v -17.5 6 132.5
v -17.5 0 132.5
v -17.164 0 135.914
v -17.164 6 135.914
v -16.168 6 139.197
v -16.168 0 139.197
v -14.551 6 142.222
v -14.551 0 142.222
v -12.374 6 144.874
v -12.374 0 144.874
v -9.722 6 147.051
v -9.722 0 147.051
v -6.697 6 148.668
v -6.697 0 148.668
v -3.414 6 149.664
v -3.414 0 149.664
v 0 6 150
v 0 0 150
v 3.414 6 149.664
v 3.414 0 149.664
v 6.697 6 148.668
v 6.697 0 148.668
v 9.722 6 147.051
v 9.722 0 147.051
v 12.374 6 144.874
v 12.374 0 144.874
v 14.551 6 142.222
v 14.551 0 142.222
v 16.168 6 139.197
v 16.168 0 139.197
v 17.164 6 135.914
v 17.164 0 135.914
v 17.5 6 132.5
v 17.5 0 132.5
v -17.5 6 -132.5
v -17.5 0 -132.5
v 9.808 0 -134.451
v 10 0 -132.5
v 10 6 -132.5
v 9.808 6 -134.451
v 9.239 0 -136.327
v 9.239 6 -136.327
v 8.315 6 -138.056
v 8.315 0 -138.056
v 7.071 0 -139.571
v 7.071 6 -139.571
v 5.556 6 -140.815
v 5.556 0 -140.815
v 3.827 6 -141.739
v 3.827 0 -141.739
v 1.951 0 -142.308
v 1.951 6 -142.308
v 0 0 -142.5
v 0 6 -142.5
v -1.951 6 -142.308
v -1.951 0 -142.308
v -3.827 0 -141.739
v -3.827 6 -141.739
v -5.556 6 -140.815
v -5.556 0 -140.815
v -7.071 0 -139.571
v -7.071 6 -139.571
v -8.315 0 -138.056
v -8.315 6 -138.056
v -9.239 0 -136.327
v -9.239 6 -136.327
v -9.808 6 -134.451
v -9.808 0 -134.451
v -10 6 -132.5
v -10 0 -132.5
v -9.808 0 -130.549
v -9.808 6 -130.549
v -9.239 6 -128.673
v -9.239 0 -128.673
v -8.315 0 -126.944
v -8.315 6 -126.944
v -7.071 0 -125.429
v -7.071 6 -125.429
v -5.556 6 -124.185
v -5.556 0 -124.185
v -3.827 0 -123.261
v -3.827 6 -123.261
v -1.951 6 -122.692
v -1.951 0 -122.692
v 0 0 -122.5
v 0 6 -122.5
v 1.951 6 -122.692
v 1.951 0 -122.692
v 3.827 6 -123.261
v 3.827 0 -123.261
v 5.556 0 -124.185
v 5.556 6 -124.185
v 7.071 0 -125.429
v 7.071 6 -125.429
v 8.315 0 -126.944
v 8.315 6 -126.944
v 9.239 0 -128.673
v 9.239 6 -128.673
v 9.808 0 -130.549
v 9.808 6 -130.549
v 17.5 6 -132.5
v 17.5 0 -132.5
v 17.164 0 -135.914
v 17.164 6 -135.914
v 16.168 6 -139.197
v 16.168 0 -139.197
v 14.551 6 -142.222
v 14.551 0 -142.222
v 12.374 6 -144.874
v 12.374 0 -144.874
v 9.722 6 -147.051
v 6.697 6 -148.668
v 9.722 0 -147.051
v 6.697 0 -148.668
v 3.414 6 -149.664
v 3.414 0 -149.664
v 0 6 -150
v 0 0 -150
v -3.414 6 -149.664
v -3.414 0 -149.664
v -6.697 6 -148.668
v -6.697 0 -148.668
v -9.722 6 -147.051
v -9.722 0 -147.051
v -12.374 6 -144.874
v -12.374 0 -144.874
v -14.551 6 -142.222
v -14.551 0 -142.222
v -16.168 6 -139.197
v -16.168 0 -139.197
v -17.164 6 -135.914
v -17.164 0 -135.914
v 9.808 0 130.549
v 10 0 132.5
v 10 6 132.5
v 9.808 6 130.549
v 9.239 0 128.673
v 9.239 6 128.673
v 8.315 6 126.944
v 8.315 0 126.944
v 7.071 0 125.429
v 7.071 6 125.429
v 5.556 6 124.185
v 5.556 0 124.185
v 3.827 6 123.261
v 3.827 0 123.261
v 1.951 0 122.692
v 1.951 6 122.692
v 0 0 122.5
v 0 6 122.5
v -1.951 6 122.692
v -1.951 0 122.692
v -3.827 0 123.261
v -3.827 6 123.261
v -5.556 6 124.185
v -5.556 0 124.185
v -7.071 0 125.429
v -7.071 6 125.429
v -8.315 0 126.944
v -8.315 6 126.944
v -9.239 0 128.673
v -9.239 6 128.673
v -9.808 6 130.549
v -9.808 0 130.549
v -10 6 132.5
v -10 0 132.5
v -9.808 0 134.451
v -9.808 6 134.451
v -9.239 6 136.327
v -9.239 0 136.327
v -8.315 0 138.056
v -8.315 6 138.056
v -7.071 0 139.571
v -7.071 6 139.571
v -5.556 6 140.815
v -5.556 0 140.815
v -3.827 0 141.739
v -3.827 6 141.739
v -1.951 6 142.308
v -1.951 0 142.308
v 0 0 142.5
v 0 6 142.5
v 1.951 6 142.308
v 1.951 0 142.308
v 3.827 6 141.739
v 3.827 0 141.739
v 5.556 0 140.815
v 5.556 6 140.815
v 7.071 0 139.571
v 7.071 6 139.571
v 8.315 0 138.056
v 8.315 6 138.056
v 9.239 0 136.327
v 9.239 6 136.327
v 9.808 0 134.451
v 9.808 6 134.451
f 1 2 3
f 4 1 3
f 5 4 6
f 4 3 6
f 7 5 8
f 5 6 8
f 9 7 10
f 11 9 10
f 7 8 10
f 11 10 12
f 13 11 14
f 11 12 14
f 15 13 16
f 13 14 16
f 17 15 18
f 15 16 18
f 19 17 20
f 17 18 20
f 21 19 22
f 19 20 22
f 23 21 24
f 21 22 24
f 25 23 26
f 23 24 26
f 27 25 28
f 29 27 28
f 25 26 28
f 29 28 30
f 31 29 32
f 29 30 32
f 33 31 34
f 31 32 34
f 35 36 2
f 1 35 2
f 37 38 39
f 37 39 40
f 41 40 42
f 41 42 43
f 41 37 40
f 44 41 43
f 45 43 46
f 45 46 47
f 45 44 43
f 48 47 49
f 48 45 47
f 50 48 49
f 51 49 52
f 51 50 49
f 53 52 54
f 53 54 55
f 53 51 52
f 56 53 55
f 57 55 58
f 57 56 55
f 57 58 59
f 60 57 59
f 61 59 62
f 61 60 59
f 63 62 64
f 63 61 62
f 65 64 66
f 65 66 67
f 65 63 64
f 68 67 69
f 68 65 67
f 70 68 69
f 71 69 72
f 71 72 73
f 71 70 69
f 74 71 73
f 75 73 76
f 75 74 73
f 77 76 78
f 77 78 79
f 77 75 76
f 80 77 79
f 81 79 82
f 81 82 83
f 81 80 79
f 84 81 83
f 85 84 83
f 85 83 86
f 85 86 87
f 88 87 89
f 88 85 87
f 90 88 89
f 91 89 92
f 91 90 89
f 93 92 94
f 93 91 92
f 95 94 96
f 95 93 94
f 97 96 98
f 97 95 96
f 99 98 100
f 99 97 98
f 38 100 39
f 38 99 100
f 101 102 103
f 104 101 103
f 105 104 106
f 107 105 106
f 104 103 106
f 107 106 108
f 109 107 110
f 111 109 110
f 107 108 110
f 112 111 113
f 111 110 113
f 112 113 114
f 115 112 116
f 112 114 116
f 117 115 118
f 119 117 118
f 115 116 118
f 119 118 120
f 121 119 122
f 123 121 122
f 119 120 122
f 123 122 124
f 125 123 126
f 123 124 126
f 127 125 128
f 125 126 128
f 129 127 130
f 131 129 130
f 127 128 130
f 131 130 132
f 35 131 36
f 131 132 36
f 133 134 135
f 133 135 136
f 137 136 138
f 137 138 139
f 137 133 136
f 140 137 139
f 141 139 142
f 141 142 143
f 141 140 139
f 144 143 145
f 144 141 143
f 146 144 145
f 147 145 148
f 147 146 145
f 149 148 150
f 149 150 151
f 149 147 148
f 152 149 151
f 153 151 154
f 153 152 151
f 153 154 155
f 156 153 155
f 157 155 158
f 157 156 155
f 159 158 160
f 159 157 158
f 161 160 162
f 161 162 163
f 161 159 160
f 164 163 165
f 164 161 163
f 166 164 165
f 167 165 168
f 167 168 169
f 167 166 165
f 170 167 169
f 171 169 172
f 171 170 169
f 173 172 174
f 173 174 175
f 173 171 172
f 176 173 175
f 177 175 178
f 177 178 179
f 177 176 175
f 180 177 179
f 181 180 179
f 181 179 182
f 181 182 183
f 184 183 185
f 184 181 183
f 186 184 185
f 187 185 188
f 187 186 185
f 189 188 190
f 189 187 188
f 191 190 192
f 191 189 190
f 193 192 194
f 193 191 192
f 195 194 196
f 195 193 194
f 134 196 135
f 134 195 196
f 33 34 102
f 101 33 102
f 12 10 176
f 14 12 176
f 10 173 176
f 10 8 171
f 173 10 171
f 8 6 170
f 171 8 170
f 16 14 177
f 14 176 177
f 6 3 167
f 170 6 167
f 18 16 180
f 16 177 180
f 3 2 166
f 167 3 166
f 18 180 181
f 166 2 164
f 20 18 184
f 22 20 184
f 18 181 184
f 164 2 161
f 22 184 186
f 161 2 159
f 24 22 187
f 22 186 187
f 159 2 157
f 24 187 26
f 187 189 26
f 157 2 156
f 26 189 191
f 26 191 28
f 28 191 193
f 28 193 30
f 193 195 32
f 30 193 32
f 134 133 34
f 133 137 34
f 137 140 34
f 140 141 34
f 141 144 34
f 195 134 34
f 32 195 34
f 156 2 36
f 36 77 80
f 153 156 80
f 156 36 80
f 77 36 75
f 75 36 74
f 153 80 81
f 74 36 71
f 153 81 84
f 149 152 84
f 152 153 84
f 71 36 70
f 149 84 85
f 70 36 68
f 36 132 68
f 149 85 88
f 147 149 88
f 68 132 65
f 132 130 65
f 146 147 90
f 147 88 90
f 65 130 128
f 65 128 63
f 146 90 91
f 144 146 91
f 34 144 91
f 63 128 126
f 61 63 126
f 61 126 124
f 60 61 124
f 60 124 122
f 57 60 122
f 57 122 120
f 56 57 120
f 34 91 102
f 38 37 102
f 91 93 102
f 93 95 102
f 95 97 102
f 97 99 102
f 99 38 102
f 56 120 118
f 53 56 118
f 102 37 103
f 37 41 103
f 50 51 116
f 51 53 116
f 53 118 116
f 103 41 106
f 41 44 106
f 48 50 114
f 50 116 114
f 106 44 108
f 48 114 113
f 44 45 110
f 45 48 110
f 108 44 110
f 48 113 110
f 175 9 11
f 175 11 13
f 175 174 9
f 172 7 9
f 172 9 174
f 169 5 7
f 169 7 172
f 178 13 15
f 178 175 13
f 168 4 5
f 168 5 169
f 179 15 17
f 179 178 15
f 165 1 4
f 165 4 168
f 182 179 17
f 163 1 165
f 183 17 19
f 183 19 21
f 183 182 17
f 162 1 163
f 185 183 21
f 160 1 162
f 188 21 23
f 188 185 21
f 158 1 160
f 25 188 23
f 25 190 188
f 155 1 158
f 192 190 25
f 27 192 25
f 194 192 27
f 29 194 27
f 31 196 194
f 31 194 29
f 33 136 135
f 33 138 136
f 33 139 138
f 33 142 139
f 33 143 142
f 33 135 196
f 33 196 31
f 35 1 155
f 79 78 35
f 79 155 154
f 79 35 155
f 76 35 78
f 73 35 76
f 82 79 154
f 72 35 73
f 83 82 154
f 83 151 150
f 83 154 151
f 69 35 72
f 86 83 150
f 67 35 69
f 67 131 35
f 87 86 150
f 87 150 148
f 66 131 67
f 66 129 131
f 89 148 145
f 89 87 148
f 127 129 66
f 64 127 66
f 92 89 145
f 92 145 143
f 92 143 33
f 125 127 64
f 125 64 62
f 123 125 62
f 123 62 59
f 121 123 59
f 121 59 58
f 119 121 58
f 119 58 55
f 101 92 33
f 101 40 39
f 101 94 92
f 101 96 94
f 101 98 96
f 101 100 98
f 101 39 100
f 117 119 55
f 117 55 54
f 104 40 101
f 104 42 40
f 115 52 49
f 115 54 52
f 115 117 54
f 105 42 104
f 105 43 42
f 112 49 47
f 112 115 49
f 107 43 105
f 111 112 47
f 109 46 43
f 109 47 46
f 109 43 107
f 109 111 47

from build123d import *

# Parameters (mm, degrees)
SKETCH1_R           = 17.5
SKETCH1_R_2         = 10
BOSS_EXTRUDE1_DEPTH = 6


with BuildPart() as part:
    # Sketch1 → Boss-Extrude1 (new body)
    with BuildSketch(Plane(origin=(0, 0, 0), x_dir=(1, 0, 0), z_dir=(0, 1, 0))):
        with BuildLine():
            ThreePointArc((17.5, 132.5), (0, 115), (-17.5, 132.5))
            Line((-17.5, 132.5), (-17.5, -132.5))
            ThreePointArc((-17.5, -132.5), (0, -115), (17.5, -132.5))
            Line((17.5, -132.5), (17.5, 132.5))
        make_face()
        with Locations((0, 132.5)):
            Circle(SKETCH1_R)
        with Locations((0, 132.5)):
            Circle(SKETCH1_R_2, mode=Mode.SUBTRACT)
        with Locations((0, -132.5)):
            Circle(SKETCH1_R)
        with Locations((0, -132.5)):
            Circle(SKETCH1_R_2, mode=Mode.SUBTRACT)
    extrude(amount=BOSS_EXTRUDE1_DEPTH)


solid = part.part
